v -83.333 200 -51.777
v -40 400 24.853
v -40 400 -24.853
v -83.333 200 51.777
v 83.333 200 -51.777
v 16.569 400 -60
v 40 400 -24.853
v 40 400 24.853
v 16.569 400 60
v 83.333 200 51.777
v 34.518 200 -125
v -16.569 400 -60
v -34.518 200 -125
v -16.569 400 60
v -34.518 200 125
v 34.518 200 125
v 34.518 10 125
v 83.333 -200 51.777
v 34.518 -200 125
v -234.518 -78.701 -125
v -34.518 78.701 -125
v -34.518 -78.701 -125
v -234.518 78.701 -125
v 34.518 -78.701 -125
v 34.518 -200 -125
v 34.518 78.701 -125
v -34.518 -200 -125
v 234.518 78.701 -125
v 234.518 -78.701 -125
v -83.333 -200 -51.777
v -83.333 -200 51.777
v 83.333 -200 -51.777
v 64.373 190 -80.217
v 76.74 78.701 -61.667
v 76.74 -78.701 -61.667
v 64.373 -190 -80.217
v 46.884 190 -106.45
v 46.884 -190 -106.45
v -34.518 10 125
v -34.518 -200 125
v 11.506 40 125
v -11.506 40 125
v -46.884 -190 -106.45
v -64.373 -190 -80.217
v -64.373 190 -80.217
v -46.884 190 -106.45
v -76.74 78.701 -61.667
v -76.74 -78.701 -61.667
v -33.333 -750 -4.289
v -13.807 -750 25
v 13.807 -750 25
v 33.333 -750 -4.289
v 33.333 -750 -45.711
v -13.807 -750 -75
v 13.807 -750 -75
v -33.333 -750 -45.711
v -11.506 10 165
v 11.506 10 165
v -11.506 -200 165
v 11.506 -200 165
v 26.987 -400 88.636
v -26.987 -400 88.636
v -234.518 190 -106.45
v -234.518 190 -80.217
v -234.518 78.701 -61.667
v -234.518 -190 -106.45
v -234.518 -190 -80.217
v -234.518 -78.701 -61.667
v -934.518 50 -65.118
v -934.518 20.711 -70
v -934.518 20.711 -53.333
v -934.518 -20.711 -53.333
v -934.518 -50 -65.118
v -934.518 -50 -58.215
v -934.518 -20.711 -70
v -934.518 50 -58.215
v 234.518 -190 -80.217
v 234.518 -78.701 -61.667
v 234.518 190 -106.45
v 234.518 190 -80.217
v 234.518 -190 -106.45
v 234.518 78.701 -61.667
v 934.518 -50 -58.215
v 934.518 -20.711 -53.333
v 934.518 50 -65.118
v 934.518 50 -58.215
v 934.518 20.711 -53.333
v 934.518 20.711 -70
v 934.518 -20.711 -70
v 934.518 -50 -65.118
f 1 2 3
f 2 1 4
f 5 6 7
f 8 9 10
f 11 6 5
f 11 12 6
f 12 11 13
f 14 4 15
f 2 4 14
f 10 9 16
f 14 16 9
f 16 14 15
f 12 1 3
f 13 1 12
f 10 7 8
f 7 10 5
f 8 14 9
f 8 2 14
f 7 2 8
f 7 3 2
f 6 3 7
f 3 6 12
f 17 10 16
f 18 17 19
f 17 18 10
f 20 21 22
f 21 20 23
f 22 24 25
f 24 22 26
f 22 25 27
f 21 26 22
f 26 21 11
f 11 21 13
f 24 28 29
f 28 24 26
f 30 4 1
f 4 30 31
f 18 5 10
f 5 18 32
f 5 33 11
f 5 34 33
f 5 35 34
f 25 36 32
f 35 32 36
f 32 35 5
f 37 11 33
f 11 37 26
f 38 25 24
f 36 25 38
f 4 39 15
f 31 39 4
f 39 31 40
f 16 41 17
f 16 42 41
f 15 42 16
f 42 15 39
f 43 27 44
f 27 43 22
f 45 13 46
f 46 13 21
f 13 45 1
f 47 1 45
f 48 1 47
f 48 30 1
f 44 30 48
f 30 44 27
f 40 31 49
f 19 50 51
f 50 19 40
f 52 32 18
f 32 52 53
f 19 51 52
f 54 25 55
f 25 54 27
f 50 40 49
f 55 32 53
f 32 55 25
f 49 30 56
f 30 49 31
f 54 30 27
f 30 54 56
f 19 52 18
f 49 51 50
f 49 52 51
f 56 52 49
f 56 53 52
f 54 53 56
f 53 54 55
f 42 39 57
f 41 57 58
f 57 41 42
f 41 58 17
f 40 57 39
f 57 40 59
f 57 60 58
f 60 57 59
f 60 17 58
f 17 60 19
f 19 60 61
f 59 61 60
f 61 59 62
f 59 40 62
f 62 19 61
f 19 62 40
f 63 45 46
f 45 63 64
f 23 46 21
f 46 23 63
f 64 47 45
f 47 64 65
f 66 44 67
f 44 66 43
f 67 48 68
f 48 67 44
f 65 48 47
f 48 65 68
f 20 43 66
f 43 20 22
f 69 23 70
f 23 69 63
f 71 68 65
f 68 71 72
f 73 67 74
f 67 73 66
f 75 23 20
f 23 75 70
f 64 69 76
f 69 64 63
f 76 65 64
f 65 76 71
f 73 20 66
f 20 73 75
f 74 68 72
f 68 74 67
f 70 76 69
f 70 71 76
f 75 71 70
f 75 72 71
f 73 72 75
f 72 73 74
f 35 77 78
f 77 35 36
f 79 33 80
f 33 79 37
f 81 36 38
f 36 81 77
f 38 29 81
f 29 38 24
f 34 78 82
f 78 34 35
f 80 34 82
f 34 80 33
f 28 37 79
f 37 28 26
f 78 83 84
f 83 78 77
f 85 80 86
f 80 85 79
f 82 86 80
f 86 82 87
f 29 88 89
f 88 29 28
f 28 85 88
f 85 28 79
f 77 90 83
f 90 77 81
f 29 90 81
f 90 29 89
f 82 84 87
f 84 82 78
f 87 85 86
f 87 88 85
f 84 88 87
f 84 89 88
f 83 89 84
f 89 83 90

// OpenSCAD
// Hawker Hurricane

use <common.scad>

/*
Fuselage parts:
    1. octagonal frustum, front of wings
    2. octagonal prism, from leading to trailing edge of wings
    3. octagonal frustum, from trailing edge of wings to tail
*/
FUA  = 2/3;  // width/height (must be uniform)
FUL1 = 200;
FUH1 = 120;
FUL2 = 400;
FUH2 = 250;
FUL3 = 550;
FUH3 = 100;
FUW1 = FUA*FUH1;
FUW2 = FUA*FUH2;
FUW3 = FUA*FUH3;
FBW2 = FUW2/(1+sqrt(2));  // width of flat bottom and top
FUE3 = -1/10;  // elevation (of FUH2)

// wings ("length"=root to tip)
WIA  = 1/6;  // height/width (must be uniform)
WIL1 = 200;
WIW1 = 380;
WIL2 = 700;
WIW2 = 100;  // at tip
WIH1 = WIA*WIW1;
WIH2 = WIA*WIW2;
WTE  = 1/2;  // wingtip elevation (of WIH1)

/*
cockpit; parts:
    1. front     (windshield)
    2. mid-front (side windows)
    3. mid-rear  (unglazed)
    4. rear      (unglazed)
*/
COW  = FBW2;
COL1 =   30;
COL2 =  150;
COL3 =   60;
COL4 =  200;
COH  =   40;

// colors
FUC = [.8, .5, .5];  // fuselage
PLC = [.8, .8, .5];  // wings and stabilisers
OTC = [.5, .8, .8];  // other parts

// fuselage
color(FUC) {
    // front
    translate([0, (FUL1+FUL2)/2, 0]) {
        scale([FUW2, FUL1, FUH2]) right_oct_frustum(FUH1/FUH2);
    }
    // mid
    scale([FUW2, FUL2, FUH2]) oct_prism();
    // rear
    translate([0, -(FUL2+FUL3)/2, 0]) rotate(180) {
        scale([FUW2, FUL3, FUH2]) oct_frustum(FUH3/FUH2, 0, FUE3);
    }
}

// cockpit; Y of mid-rear part = Y of rear of mid fuselage
translate([0, 0, (FUH2+COH)/2]) {
    // front
    color(OTC) translate([0, COL2+COL3+(COL1-FUL2)/2, 0]) {
        scale([COW, COL1, COH]) cockpit_end(1/3, -1/2);
    }
    // mid-front
    color(OTC) translate([0, COL3+(COL2-FUL2)/2, 0]) {
        scale([COW, COL2, COH]) trapez_prism();
    }
    // mid-rear
    color(FUC) translate([0, (COL3-FUL2)/2, 0]) {
        scale([COW, COL3, COH]) trapez_prism();
    }
    // rear
    color(FUC) translate([0, -(FUL2+COL4)/2, 0]) {
        scale([COW, COL4, COH]) rotate(180) {
            cockpit_end(
                1-COL4/FUL3*(1-FUW3/FUW2),
                -1/2 + ((FUH3-FUH2)/2+FUE3*FUH2)/FUL3 * COL4/COH
            );
        }
    }
}

// wings
color(PLC) for(x = [-1, 1]) {
    // inner
    translate([x*(WIL1+FBW2)/2, 0, (WIH1-FUH2)/2]) rotate(-x*90) {
        scale([WIW1, WIL1, WIH1]) oct_prism();
    }
    // outer
    translate([x*(WIL1+(WIL2+FBW2)/2), 0, (WIH1-FUH2)/2]) rotate(-x*90) {
        scale([WIW1, WIL2, WIH1]) oct_frustum(WIW2/WIW1, 0, WTE);
    }
}

module trapez_prism() {
    /*
    a trapezoidal prism; trapezoids face front and rear;
    length, height and bottom width = 1;
    top width = 1/3
    */
    a = 1/6;
    b = 1/2;
    polyhedron(
        [
            // rear
            [-b, -b, -b],
            [-a, -b,  b],
            [ a, -b,  b],
            [ b, -b, -b],
            // front
            [-b,  b, -b],
            [-a,  b,  b],
            [ a,  b,  b],
            [ b,  b, -b],
        ],
        [
            [0, 1, 2, 3],
            [0, 3, 7, 4],
            [0, 4, 5, 1],
            [1, 5, 6, 2],
            [2, 6, 7, 3],
            [4, 7, 6, 5],
        ]
    );
}

module cockpit_end(fxs, fzo) {
    /*
    trapezoid on rear end, horizontal line on front end;
    an irregular triangular prism?
    maximum dimensions: 1*1*1 if fzo=0;
    fxs = front X scale factor (1 = same as rear);
    fzo = front Z offset (from centerline)
    */
    a  = 1/6;
    b  = 1/2;
    fx = fxs/2;
    polyhedron(
        [
            // rear
            [ -b, -b,  -b],
            [ -a, -b,   b],
            [  a, -b,   b],
            [  b, -b,  -b],
            // front
            [-fx,  b, fzo],
            [ fx,  b, fzo],
        ],
        [
            [0, 1, 2, 3],
            [0, 3, 5, 4],
            [1, 4, 5, 2],
            [0, 4, 1],
            [2, 5, 3],
        ]
    );
}
